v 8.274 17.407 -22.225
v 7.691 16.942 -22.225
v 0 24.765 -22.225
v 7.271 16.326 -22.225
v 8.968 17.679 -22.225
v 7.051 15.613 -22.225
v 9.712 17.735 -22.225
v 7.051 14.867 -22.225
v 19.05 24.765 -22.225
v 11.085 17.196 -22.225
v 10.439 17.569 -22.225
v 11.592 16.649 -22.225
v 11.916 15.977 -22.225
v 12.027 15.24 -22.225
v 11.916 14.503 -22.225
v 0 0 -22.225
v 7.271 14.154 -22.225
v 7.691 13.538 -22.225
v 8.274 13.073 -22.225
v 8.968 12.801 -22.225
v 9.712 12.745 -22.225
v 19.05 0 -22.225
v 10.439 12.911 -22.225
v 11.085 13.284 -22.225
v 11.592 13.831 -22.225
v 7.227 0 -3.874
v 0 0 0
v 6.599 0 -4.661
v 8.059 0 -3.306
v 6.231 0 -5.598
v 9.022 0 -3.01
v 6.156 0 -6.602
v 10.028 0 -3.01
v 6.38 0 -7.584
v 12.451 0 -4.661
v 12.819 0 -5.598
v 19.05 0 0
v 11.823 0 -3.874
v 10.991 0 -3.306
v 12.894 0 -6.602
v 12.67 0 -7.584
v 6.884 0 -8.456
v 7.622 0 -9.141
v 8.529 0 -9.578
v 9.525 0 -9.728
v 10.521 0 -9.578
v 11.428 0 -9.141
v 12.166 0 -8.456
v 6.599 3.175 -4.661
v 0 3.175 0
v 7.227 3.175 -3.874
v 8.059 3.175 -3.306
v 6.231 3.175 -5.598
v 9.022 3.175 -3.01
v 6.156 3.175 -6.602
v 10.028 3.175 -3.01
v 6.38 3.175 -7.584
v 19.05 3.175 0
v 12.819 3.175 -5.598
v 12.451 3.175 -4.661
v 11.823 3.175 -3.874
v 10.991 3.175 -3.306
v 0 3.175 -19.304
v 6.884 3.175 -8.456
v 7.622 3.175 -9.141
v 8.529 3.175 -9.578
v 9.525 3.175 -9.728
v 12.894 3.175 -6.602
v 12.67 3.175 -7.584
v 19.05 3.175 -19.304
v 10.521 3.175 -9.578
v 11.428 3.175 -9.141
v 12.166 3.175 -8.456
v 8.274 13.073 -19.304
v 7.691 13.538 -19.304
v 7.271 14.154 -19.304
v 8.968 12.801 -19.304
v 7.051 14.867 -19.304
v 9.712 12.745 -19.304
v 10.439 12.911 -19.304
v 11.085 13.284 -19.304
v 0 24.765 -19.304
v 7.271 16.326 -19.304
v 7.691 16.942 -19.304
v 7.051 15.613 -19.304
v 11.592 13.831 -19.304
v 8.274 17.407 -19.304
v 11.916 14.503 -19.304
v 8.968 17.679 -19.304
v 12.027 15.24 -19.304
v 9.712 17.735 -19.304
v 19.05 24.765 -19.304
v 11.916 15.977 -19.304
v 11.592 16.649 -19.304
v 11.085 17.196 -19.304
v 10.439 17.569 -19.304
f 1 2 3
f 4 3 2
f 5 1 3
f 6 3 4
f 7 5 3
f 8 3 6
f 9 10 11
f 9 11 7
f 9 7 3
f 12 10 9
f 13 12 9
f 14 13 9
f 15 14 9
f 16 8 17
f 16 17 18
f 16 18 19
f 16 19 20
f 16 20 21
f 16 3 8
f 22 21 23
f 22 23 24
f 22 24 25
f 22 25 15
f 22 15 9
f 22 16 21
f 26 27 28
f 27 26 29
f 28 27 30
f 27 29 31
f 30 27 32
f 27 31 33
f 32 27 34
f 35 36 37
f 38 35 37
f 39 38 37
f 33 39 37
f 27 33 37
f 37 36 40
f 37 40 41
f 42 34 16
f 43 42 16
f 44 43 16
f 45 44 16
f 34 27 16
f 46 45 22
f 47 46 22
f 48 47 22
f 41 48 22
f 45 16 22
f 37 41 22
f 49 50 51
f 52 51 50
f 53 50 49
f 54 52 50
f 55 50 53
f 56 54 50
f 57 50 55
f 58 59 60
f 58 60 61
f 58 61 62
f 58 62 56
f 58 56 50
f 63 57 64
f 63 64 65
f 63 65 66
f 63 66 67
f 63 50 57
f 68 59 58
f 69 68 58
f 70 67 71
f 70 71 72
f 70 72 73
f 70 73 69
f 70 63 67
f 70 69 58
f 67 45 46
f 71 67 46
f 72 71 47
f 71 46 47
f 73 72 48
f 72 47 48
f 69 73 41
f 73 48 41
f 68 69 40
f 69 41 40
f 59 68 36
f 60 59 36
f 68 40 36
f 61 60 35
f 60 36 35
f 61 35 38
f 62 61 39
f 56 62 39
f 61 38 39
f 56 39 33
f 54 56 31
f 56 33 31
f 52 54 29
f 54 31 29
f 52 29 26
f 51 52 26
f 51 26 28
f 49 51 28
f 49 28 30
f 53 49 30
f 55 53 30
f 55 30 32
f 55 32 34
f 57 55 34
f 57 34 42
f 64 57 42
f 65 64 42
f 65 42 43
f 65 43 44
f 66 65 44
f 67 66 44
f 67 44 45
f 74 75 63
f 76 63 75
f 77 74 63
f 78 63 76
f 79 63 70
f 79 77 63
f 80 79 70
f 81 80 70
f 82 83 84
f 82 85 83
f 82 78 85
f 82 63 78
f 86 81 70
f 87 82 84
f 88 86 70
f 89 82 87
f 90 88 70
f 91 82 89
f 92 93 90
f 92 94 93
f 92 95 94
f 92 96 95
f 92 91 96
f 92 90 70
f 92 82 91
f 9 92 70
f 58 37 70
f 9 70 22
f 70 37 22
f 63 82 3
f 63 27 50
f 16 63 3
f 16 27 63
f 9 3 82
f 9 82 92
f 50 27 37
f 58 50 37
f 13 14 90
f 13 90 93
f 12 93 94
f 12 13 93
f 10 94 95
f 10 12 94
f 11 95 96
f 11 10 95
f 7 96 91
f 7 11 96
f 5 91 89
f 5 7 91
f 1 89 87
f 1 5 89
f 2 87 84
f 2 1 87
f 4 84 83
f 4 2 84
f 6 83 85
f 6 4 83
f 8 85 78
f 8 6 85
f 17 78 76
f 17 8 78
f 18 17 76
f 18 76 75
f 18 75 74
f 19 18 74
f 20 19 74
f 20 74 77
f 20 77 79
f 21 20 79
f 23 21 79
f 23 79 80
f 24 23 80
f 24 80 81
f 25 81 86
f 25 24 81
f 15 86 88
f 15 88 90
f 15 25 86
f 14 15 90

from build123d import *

# Parameters (mm, degrees)
SKETCH1_W                = 19.05
SKETCH1_H                = 22.225
BOSS_EXTRUDE1_DEPTH      = 3.175
SKETCH2_W                = 19.05
SKETCH2_H                = 3.175
BOSS_EXTRUDE2_DEPTH      = 21.59
F_1_4_CLEARANCE_HOLE2_D  = 6.7564
F_8_CLEARANCE_HOLE1_D    = 4.4958
MOVE_START               = -19.304
MOVE_FACE1_OUTLINE_W     = 19.05
MOVE_FACE1_OUTLINE_H     = 21.59
MOVE_FACE1_OUTLINE_R     = 2.2479
MOVE_FACE1_DEPTH         = 0.254
MOVE_START_2             = -22.225
MOVE_FACE1_2_OUTLINE_R   = 2.5019
MOVE_FACE1_2_OUTLINE_R_2 = 2.2479
MOVE_FACE1_2_DEPTH       = 2.921


# Read off the part's stored shape, not the designer's step: Move Face1
with BuildPart() as part:
    # Sketch1 → Boss-Extrude1 (new body)
    with BuildSketch(Plane(origin=(0, 0, 0), x_dir=(1, 0, 0), z_dir=(0, 1, 0))):
        with Locations((9.525, 11.1125)):
            Rectangle(SKETCH1_W, SKETCH1_H)
    extrude(amount=BOSS_EXTRUDE1_DEPTH)

    # Sketch2 → Boss-Extrude2 (add)
    with BuildSketch(Plane(origin=(0, 3.175, 0), x_dir=(1, 0, 0), z_dir=(0, 1, 0))):
        with Locations((9.525, 20.6375)):
            Rectangle(SKETCH2_W, SKETCH2_H)
    extrude(amount=BOSS_EXTRUDE2_DEPTH)

    # 1/4 Clearance Hole2 (through all)
    with Locations(Plane(origin=(9.525, 3.175, -6.35), x_dir=(0, 0, 1), z_dir=(0, 1, 0))):
        with Locations((0, 0)):
            Hole(F_1_4_CLEARANCE_HOLE2_D / 2)

    # #8 Clearance Hole1 (through all)
    with Locations(Plane(origin=(9.525, 15.24, -19.05), x_dir=(1, 0, 0), z_dir=(0, 0, 1))):
        with Locations((0, 0)):
            Hole(F_8_CLEARANCE_HOLE1_D / 2)

    # Move Face1 outline → Move Face1 (cut)
    with BuildSketch(Plane.XY.offset(MOVE_START)):
        with Locations((9.525, 13.97)):
            Rectangle(MOVE_FACE1_OUTLINE_W, MOVE_FACE1_OUTLINE_H)
        with Locations((9.525, 15.24)):
            Circle(MOVE_FACE1_OUTLINE_R, mode=Mode.SUBTRACT)
    extrude(amount=MOVE_FACE1_DEPTH, mode=Mode.SUBTRACT)

    # Move Face1 2 outline → Move Face1 2 (cut)
    with BuildSketch(Plane.XY.offset(MOVE_START_2)):
        with Locations((9.525, 15.24)):
            Circle(MOVE_FACE1_2_OUTLINE_R)
        with Locations((9.525, 15.24)):
            Circle(MOVE_FACE1_2_OUTLINE_R_2, mode=Mode.SUBTRACT)
    extrude(amount=MOVE_FACE1_2_DEPTH, mode=Mode.SUBTRACT)


solid = part.part
